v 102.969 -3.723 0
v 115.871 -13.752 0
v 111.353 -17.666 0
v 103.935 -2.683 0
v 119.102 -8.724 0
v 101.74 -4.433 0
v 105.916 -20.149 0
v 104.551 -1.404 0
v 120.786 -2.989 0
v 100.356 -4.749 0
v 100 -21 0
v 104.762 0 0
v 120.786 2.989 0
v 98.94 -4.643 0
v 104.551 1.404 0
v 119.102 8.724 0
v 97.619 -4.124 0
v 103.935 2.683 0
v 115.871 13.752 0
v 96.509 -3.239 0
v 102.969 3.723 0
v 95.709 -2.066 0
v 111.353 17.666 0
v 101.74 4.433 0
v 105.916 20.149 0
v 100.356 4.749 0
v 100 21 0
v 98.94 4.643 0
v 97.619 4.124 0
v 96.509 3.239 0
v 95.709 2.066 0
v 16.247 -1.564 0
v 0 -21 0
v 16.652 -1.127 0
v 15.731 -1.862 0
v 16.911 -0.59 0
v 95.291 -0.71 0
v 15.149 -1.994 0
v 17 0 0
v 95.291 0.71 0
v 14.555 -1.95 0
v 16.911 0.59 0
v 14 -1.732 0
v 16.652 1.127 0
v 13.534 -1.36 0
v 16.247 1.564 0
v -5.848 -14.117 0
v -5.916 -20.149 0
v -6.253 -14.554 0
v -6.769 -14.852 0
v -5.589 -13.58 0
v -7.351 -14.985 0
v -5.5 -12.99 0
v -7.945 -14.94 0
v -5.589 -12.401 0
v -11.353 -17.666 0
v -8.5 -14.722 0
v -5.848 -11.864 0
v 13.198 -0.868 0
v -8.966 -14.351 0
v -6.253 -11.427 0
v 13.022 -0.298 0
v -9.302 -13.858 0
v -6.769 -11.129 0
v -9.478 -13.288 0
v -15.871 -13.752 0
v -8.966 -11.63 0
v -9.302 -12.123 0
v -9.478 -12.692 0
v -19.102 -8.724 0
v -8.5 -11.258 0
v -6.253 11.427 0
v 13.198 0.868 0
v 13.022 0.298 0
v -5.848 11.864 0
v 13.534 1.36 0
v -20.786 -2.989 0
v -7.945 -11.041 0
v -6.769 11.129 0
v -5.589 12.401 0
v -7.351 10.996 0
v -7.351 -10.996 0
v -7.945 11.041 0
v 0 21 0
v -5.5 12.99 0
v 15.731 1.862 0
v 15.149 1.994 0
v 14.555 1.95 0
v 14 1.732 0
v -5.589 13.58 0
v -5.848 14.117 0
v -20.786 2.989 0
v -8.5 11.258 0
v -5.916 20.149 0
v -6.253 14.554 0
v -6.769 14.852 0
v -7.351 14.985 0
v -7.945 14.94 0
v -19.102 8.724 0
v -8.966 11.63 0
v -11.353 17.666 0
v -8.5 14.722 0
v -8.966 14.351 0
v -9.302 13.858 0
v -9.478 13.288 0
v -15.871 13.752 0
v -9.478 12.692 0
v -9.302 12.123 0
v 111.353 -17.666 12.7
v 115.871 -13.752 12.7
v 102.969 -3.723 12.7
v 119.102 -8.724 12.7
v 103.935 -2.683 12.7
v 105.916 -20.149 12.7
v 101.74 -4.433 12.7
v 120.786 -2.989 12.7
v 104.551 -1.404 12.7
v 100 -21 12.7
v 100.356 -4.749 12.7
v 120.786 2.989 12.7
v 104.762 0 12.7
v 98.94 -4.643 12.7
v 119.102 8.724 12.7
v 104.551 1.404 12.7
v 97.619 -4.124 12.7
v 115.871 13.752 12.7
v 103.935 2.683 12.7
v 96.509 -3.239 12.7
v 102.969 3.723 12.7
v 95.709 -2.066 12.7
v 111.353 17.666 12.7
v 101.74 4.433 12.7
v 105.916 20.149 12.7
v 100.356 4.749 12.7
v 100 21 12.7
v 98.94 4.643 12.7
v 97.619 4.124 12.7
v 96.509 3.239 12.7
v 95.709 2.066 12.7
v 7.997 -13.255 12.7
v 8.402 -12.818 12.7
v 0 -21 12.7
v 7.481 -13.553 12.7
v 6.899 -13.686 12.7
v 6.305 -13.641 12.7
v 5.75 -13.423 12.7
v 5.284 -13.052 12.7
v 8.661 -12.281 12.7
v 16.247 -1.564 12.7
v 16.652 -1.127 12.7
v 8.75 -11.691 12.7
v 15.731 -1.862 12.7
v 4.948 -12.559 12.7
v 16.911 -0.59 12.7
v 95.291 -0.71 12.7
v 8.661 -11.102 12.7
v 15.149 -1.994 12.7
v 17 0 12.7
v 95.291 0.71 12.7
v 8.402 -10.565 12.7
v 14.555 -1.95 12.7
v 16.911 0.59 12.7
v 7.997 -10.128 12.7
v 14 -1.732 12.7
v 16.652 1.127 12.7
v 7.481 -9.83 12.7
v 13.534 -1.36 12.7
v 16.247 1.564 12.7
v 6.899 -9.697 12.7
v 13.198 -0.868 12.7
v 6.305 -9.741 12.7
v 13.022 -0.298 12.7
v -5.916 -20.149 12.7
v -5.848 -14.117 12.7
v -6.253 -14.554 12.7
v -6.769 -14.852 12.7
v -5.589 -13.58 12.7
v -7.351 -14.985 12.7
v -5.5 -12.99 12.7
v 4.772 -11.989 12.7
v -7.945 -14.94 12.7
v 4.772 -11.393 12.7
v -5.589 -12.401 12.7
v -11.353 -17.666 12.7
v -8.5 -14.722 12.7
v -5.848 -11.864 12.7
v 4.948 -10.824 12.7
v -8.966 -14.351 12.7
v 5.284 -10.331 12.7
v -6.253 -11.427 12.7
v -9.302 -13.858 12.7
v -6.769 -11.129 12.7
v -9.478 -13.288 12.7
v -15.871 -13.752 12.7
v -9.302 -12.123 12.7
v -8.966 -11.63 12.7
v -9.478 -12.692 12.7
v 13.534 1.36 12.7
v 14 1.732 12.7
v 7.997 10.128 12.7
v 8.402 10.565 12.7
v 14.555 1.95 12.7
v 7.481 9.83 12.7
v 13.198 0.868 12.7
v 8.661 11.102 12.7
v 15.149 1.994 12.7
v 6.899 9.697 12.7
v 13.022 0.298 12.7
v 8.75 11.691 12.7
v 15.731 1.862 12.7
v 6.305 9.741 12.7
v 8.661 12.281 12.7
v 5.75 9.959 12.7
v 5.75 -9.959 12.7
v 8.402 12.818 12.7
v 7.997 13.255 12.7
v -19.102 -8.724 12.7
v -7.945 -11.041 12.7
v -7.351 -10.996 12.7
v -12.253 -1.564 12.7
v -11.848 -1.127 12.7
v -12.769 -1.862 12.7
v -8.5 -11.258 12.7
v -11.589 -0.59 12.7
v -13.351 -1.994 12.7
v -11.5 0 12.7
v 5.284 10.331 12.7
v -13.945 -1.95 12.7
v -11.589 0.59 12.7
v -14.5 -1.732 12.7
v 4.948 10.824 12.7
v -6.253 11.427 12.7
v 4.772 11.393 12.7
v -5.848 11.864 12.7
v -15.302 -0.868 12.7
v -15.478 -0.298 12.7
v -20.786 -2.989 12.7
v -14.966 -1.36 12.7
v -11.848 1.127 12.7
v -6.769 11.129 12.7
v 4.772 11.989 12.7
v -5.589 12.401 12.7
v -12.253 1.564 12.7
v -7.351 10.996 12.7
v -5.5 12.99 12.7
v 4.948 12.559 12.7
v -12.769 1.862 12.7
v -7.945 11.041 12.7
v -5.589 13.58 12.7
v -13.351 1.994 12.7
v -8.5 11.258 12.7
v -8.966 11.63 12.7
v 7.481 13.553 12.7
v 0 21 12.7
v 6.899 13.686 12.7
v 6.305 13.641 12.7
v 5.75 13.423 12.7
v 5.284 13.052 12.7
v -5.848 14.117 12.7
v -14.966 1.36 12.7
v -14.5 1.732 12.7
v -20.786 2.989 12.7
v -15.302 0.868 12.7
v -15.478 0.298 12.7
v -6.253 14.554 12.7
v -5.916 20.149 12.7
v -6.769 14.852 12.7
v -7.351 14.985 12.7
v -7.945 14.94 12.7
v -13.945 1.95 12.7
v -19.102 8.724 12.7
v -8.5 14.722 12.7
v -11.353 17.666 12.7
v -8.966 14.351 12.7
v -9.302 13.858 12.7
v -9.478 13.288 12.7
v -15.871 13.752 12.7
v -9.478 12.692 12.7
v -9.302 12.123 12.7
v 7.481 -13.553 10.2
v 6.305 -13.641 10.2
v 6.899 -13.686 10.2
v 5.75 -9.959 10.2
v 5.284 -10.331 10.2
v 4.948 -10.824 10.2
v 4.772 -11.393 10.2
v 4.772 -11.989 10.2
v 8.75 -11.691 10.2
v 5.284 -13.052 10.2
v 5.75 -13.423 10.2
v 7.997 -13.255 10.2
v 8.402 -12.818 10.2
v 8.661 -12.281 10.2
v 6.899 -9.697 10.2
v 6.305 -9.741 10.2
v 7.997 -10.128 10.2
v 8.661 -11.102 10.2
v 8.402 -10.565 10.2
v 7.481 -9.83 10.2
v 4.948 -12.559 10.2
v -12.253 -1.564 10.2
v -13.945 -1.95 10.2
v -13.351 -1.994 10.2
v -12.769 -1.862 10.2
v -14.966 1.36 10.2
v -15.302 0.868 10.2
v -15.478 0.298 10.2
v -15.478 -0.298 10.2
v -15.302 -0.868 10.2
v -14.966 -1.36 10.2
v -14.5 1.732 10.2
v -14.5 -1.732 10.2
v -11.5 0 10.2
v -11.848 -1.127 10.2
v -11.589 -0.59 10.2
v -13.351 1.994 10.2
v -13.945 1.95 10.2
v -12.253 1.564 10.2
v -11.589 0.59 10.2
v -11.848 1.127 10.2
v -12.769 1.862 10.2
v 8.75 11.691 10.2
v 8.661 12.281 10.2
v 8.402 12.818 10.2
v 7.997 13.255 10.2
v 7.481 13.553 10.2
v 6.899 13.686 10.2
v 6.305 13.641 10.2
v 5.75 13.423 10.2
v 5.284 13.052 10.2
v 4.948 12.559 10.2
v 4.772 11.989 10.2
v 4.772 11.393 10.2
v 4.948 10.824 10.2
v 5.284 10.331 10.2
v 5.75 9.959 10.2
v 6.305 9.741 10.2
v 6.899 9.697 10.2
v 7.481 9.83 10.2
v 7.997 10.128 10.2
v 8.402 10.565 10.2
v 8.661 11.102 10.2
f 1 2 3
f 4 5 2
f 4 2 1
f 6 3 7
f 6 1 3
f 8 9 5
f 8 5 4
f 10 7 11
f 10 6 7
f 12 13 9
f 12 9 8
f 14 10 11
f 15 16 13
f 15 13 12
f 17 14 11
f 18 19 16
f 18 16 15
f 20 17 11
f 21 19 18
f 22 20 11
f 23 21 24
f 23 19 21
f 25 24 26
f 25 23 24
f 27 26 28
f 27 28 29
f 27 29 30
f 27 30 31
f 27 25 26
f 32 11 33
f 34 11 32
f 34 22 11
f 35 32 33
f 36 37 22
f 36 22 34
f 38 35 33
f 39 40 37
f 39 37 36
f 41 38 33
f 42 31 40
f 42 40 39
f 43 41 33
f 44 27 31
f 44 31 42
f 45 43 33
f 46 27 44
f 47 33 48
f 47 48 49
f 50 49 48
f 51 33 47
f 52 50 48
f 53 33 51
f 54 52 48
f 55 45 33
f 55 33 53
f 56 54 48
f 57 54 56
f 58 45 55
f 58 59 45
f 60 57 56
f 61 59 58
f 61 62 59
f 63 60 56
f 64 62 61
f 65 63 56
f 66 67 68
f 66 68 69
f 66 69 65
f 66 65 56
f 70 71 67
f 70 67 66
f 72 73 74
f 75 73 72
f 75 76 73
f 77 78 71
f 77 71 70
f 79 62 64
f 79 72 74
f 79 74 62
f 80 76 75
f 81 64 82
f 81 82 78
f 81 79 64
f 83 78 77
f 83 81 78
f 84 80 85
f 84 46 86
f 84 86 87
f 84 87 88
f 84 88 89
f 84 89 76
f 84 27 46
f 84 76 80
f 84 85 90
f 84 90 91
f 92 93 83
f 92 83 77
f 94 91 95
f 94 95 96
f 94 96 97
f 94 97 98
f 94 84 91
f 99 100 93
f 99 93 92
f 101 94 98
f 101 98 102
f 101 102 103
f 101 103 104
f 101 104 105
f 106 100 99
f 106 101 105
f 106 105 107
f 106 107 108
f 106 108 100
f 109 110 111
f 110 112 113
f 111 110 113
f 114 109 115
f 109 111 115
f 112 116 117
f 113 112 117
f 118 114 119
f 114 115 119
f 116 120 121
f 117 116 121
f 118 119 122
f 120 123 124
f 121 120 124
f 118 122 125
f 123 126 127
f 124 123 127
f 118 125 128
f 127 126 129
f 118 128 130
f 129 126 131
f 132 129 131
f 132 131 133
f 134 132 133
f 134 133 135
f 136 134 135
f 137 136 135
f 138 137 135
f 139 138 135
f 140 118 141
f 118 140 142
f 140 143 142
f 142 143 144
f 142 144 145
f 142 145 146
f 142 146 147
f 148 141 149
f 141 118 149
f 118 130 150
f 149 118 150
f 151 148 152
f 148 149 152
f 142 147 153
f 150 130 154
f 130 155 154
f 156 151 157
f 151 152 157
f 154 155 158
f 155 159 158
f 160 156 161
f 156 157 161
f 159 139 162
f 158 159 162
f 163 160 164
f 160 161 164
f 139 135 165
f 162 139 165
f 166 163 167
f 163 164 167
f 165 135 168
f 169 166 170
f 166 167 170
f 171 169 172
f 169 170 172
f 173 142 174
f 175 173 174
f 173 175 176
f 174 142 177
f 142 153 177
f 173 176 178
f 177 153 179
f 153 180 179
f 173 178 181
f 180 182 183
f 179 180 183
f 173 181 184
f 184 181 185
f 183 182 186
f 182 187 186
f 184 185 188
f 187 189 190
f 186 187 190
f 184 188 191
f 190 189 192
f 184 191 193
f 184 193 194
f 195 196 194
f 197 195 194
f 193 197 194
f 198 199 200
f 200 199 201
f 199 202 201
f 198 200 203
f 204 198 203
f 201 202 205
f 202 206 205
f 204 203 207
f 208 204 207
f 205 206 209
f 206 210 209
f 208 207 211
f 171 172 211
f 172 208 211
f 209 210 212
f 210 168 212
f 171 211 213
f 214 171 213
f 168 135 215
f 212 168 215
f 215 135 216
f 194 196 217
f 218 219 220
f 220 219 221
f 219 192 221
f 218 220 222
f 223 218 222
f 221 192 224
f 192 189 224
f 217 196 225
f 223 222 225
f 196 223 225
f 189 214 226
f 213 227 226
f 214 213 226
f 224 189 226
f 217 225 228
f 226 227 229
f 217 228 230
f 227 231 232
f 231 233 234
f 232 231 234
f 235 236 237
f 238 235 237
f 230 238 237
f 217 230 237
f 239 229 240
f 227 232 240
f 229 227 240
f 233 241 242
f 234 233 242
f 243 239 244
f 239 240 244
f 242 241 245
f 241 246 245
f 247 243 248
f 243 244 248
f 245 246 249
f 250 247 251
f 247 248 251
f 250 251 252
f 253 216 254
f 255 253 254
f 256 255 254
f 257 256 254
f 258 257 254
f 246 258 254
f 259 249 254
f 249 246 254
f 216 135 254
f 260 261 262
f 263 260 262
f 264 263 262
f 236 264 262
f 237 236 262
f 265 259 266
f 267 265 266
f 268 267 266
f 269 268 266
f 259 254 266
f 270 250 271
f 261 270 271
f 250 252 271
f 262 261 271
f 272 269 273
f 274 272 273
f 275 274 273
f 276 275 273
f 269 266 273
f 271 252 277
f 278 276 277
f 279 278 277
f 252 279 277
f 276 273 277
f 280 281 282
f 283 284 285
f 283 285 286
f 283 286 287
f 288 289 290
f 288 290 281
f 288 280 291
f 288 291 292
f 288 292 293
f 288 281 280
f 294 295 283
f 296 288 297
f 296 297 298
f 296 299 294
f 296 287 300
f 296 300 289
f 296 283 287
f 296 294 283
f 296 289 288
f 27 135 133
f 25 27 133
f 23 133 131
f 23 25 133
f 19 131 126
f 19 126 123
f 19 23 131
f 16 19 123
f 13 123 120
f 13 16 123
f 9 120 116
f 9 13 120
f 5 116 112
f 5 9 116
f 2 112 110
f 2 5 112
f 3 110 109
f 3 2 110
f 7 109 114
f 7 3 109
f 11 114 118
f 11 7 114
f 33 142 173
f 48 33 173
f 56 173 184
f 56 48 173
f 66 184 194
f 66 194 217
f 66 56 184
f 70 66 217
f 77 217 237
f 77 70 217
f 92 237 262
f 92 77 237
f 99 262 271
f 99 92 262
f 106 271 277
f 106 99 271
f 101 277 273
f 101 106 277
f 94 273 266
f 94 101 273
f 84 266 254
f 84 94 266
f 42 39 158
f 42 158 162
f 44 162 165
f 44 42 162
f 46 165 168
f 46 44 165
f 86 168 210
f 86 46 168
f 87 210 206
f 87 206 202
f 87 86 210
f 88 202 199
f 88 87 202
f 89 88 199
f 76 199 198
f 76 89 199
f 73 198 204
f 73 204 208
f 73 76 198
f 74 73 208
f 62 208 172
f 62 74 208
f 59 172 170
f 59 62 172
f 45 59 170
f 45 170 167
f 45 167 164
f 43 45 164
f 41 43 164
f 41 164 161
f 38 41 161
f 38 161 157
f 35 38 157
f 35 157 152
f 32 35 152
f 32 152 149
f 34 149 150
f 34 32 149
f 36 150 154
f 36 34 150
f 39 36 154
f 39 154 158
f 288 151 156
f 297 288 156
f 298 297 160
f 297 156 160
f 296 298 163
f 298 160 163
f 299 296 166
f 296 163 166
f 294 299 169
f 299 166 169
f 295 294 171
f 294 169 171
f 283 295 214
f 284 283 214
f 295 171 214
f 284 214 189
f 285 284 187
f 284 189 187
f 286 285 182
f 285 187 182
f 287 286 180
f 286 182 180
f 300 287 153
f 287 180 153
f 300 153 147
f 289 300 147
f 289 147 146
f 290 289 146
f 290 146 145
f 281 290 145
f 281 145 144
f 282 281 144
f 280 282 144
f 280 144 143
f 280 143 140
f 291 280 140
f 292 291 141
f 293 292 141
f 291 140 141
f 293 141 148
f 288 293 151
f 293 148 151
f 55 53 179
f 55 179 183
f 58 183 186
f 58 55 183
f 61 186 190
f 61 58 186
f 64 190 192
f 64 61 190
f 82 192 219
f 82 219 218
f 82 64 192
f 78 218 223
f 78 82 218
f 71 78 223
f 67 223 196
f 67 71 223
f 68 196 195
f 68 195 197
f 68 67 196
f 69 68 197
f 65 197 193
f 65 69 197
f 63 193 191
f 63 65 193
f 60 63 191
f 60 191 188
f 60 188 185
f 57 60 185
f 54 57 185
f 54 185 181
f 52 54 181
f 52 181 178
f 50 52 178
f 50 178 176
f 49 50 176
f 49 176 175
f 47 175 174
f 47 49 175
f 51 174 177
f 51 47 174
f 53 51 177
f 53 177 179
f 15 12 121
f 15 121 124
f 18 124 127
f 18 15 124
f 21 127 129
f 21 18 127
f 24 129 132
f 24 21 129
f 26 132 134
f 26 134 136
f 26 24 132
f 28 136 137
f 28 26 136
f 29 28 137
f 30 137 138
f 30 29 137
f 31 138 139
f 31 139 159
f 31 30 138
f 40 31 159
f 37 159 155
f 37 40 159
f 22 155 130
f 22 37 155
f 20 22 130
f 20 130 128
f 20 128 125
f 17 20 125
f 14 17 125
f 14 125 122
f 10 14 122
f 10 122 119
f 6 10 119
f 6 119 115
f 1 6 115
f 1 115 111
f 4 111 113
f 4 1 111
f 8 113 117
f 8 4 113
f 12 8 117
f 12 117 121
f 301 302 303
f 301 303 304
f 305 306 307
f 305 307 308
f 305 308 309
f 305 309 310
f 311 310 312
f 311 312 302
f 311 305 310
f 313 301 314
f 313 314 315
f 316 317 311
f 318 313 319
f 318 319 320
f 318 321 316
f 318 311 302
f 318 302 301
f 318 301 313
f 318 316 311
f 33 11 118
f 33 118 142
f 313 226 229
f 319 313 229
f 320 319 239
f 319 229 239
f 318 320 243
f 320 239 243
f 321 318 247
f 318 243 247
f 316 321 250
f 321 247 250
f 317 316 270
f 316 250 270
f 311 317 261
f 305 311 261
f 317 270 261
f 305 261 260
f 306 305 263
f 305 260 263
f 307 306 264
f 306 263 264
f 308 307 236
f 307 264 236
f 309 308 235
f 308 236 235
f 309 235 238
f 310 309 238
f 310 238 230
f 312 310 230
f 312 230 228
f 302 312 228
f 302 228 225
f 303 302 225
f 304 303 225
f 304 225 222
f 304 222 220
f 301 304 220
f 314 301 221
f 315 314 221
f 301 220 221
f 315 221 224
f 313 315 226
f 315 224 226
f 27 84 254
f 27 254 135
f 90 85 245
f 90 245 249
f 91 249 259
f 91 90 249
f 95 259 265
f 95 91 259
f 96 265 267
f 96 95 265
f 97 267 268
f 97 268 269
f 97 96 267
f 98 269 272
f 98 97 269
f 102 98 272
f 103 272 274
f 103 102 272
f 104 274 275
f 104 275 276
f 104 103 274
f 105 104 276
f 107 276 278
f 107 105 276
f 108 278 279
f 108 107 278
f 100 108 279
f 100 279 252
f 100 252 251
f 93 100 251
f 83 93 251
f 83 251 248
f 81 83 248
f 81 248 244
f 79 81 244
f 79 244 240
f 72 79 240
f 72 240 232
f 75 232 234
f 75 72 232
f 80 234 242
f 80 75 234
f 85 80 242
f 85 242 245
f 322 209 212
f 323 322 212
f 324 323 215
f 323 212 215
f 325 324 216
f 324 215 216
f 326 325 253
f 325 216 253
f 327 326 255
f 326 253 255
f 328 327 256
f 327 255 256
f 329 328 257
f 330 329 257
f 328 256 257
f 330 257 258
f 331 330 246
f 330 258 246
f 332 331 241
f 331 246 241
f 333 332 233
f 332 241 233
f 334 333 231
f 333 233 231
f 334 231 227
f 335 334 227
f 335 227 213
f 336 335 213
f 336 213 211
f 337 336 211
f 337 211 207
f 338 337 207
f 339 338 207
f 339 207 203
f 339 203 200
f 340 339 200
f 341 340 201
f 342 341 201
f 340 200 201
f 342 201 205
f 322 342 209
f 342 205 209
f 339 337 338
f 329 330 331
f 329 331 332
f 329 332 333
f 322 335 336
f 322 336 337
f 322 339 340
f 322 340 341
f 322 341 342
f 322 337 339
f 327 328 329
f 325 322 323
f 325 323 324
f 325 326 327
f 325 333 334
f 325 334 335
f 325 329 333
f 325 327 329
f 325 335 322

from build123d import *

# Parameters (mm, degrees)
SKETCH1_R           = 4.7625
SKETCH1_R_2         = 2
BOSS_EXTRUDE2_DEPTH = 12.7
SKETCH2_R           = 2
CUT_EXTRUDE1_DEPTH  = 2.5


with BuildPart() as part:
    # Sketch1 → Boss-Extrude2 (new body)
    with BuildSketch(Plane.XY):
        with BuildLine():
            Line((0, 21), (100, 21))
            ThreePointArc((100, 21), (121, 0), (100, -21))
            Line((100, -21), (0, -21))
            ThreePointArc((0, -21), (-21, 0), (0, 21))
        make_face()
        with Locations((100, 0)):
            Circle(SKETCH1_R, mode=Mode.SUBTRACT)
        with Locations((15, 0)):
            Circle(SKETCH1_R_2, mode=Mode.SUBTRACT)
        with Locations((-7.5, -12.990381057)):
            Circle(SKETCH1_R_2, mode=Mode.SUBTRACT)
        with Locations((-7.5, 12.990381057)):
            Circle(SKETCH1_R_2, mode=Mode.SUBTRACT)
    extrude(amount=BOSS_EXTRUDE2_DEPTH)

    # Sketch2 → Cut-Extrude1 (cut)
    with BuildSketch(Plane.XY.offset(12.7)):
        with Locations((-13.5, 0)):
            Circle(SKETCH2_R)
        with Locations((6.75, 11.691342951)):
            Circle(SKETCH2_R)
        with Locations((6.75, -11.691342951)):
            Circle(SKETCH2_R)
    extrude(amount=-CUT_EXTRUDE1_DEPTH, mode=Mode.SUBTRACT)


solid = part.part
